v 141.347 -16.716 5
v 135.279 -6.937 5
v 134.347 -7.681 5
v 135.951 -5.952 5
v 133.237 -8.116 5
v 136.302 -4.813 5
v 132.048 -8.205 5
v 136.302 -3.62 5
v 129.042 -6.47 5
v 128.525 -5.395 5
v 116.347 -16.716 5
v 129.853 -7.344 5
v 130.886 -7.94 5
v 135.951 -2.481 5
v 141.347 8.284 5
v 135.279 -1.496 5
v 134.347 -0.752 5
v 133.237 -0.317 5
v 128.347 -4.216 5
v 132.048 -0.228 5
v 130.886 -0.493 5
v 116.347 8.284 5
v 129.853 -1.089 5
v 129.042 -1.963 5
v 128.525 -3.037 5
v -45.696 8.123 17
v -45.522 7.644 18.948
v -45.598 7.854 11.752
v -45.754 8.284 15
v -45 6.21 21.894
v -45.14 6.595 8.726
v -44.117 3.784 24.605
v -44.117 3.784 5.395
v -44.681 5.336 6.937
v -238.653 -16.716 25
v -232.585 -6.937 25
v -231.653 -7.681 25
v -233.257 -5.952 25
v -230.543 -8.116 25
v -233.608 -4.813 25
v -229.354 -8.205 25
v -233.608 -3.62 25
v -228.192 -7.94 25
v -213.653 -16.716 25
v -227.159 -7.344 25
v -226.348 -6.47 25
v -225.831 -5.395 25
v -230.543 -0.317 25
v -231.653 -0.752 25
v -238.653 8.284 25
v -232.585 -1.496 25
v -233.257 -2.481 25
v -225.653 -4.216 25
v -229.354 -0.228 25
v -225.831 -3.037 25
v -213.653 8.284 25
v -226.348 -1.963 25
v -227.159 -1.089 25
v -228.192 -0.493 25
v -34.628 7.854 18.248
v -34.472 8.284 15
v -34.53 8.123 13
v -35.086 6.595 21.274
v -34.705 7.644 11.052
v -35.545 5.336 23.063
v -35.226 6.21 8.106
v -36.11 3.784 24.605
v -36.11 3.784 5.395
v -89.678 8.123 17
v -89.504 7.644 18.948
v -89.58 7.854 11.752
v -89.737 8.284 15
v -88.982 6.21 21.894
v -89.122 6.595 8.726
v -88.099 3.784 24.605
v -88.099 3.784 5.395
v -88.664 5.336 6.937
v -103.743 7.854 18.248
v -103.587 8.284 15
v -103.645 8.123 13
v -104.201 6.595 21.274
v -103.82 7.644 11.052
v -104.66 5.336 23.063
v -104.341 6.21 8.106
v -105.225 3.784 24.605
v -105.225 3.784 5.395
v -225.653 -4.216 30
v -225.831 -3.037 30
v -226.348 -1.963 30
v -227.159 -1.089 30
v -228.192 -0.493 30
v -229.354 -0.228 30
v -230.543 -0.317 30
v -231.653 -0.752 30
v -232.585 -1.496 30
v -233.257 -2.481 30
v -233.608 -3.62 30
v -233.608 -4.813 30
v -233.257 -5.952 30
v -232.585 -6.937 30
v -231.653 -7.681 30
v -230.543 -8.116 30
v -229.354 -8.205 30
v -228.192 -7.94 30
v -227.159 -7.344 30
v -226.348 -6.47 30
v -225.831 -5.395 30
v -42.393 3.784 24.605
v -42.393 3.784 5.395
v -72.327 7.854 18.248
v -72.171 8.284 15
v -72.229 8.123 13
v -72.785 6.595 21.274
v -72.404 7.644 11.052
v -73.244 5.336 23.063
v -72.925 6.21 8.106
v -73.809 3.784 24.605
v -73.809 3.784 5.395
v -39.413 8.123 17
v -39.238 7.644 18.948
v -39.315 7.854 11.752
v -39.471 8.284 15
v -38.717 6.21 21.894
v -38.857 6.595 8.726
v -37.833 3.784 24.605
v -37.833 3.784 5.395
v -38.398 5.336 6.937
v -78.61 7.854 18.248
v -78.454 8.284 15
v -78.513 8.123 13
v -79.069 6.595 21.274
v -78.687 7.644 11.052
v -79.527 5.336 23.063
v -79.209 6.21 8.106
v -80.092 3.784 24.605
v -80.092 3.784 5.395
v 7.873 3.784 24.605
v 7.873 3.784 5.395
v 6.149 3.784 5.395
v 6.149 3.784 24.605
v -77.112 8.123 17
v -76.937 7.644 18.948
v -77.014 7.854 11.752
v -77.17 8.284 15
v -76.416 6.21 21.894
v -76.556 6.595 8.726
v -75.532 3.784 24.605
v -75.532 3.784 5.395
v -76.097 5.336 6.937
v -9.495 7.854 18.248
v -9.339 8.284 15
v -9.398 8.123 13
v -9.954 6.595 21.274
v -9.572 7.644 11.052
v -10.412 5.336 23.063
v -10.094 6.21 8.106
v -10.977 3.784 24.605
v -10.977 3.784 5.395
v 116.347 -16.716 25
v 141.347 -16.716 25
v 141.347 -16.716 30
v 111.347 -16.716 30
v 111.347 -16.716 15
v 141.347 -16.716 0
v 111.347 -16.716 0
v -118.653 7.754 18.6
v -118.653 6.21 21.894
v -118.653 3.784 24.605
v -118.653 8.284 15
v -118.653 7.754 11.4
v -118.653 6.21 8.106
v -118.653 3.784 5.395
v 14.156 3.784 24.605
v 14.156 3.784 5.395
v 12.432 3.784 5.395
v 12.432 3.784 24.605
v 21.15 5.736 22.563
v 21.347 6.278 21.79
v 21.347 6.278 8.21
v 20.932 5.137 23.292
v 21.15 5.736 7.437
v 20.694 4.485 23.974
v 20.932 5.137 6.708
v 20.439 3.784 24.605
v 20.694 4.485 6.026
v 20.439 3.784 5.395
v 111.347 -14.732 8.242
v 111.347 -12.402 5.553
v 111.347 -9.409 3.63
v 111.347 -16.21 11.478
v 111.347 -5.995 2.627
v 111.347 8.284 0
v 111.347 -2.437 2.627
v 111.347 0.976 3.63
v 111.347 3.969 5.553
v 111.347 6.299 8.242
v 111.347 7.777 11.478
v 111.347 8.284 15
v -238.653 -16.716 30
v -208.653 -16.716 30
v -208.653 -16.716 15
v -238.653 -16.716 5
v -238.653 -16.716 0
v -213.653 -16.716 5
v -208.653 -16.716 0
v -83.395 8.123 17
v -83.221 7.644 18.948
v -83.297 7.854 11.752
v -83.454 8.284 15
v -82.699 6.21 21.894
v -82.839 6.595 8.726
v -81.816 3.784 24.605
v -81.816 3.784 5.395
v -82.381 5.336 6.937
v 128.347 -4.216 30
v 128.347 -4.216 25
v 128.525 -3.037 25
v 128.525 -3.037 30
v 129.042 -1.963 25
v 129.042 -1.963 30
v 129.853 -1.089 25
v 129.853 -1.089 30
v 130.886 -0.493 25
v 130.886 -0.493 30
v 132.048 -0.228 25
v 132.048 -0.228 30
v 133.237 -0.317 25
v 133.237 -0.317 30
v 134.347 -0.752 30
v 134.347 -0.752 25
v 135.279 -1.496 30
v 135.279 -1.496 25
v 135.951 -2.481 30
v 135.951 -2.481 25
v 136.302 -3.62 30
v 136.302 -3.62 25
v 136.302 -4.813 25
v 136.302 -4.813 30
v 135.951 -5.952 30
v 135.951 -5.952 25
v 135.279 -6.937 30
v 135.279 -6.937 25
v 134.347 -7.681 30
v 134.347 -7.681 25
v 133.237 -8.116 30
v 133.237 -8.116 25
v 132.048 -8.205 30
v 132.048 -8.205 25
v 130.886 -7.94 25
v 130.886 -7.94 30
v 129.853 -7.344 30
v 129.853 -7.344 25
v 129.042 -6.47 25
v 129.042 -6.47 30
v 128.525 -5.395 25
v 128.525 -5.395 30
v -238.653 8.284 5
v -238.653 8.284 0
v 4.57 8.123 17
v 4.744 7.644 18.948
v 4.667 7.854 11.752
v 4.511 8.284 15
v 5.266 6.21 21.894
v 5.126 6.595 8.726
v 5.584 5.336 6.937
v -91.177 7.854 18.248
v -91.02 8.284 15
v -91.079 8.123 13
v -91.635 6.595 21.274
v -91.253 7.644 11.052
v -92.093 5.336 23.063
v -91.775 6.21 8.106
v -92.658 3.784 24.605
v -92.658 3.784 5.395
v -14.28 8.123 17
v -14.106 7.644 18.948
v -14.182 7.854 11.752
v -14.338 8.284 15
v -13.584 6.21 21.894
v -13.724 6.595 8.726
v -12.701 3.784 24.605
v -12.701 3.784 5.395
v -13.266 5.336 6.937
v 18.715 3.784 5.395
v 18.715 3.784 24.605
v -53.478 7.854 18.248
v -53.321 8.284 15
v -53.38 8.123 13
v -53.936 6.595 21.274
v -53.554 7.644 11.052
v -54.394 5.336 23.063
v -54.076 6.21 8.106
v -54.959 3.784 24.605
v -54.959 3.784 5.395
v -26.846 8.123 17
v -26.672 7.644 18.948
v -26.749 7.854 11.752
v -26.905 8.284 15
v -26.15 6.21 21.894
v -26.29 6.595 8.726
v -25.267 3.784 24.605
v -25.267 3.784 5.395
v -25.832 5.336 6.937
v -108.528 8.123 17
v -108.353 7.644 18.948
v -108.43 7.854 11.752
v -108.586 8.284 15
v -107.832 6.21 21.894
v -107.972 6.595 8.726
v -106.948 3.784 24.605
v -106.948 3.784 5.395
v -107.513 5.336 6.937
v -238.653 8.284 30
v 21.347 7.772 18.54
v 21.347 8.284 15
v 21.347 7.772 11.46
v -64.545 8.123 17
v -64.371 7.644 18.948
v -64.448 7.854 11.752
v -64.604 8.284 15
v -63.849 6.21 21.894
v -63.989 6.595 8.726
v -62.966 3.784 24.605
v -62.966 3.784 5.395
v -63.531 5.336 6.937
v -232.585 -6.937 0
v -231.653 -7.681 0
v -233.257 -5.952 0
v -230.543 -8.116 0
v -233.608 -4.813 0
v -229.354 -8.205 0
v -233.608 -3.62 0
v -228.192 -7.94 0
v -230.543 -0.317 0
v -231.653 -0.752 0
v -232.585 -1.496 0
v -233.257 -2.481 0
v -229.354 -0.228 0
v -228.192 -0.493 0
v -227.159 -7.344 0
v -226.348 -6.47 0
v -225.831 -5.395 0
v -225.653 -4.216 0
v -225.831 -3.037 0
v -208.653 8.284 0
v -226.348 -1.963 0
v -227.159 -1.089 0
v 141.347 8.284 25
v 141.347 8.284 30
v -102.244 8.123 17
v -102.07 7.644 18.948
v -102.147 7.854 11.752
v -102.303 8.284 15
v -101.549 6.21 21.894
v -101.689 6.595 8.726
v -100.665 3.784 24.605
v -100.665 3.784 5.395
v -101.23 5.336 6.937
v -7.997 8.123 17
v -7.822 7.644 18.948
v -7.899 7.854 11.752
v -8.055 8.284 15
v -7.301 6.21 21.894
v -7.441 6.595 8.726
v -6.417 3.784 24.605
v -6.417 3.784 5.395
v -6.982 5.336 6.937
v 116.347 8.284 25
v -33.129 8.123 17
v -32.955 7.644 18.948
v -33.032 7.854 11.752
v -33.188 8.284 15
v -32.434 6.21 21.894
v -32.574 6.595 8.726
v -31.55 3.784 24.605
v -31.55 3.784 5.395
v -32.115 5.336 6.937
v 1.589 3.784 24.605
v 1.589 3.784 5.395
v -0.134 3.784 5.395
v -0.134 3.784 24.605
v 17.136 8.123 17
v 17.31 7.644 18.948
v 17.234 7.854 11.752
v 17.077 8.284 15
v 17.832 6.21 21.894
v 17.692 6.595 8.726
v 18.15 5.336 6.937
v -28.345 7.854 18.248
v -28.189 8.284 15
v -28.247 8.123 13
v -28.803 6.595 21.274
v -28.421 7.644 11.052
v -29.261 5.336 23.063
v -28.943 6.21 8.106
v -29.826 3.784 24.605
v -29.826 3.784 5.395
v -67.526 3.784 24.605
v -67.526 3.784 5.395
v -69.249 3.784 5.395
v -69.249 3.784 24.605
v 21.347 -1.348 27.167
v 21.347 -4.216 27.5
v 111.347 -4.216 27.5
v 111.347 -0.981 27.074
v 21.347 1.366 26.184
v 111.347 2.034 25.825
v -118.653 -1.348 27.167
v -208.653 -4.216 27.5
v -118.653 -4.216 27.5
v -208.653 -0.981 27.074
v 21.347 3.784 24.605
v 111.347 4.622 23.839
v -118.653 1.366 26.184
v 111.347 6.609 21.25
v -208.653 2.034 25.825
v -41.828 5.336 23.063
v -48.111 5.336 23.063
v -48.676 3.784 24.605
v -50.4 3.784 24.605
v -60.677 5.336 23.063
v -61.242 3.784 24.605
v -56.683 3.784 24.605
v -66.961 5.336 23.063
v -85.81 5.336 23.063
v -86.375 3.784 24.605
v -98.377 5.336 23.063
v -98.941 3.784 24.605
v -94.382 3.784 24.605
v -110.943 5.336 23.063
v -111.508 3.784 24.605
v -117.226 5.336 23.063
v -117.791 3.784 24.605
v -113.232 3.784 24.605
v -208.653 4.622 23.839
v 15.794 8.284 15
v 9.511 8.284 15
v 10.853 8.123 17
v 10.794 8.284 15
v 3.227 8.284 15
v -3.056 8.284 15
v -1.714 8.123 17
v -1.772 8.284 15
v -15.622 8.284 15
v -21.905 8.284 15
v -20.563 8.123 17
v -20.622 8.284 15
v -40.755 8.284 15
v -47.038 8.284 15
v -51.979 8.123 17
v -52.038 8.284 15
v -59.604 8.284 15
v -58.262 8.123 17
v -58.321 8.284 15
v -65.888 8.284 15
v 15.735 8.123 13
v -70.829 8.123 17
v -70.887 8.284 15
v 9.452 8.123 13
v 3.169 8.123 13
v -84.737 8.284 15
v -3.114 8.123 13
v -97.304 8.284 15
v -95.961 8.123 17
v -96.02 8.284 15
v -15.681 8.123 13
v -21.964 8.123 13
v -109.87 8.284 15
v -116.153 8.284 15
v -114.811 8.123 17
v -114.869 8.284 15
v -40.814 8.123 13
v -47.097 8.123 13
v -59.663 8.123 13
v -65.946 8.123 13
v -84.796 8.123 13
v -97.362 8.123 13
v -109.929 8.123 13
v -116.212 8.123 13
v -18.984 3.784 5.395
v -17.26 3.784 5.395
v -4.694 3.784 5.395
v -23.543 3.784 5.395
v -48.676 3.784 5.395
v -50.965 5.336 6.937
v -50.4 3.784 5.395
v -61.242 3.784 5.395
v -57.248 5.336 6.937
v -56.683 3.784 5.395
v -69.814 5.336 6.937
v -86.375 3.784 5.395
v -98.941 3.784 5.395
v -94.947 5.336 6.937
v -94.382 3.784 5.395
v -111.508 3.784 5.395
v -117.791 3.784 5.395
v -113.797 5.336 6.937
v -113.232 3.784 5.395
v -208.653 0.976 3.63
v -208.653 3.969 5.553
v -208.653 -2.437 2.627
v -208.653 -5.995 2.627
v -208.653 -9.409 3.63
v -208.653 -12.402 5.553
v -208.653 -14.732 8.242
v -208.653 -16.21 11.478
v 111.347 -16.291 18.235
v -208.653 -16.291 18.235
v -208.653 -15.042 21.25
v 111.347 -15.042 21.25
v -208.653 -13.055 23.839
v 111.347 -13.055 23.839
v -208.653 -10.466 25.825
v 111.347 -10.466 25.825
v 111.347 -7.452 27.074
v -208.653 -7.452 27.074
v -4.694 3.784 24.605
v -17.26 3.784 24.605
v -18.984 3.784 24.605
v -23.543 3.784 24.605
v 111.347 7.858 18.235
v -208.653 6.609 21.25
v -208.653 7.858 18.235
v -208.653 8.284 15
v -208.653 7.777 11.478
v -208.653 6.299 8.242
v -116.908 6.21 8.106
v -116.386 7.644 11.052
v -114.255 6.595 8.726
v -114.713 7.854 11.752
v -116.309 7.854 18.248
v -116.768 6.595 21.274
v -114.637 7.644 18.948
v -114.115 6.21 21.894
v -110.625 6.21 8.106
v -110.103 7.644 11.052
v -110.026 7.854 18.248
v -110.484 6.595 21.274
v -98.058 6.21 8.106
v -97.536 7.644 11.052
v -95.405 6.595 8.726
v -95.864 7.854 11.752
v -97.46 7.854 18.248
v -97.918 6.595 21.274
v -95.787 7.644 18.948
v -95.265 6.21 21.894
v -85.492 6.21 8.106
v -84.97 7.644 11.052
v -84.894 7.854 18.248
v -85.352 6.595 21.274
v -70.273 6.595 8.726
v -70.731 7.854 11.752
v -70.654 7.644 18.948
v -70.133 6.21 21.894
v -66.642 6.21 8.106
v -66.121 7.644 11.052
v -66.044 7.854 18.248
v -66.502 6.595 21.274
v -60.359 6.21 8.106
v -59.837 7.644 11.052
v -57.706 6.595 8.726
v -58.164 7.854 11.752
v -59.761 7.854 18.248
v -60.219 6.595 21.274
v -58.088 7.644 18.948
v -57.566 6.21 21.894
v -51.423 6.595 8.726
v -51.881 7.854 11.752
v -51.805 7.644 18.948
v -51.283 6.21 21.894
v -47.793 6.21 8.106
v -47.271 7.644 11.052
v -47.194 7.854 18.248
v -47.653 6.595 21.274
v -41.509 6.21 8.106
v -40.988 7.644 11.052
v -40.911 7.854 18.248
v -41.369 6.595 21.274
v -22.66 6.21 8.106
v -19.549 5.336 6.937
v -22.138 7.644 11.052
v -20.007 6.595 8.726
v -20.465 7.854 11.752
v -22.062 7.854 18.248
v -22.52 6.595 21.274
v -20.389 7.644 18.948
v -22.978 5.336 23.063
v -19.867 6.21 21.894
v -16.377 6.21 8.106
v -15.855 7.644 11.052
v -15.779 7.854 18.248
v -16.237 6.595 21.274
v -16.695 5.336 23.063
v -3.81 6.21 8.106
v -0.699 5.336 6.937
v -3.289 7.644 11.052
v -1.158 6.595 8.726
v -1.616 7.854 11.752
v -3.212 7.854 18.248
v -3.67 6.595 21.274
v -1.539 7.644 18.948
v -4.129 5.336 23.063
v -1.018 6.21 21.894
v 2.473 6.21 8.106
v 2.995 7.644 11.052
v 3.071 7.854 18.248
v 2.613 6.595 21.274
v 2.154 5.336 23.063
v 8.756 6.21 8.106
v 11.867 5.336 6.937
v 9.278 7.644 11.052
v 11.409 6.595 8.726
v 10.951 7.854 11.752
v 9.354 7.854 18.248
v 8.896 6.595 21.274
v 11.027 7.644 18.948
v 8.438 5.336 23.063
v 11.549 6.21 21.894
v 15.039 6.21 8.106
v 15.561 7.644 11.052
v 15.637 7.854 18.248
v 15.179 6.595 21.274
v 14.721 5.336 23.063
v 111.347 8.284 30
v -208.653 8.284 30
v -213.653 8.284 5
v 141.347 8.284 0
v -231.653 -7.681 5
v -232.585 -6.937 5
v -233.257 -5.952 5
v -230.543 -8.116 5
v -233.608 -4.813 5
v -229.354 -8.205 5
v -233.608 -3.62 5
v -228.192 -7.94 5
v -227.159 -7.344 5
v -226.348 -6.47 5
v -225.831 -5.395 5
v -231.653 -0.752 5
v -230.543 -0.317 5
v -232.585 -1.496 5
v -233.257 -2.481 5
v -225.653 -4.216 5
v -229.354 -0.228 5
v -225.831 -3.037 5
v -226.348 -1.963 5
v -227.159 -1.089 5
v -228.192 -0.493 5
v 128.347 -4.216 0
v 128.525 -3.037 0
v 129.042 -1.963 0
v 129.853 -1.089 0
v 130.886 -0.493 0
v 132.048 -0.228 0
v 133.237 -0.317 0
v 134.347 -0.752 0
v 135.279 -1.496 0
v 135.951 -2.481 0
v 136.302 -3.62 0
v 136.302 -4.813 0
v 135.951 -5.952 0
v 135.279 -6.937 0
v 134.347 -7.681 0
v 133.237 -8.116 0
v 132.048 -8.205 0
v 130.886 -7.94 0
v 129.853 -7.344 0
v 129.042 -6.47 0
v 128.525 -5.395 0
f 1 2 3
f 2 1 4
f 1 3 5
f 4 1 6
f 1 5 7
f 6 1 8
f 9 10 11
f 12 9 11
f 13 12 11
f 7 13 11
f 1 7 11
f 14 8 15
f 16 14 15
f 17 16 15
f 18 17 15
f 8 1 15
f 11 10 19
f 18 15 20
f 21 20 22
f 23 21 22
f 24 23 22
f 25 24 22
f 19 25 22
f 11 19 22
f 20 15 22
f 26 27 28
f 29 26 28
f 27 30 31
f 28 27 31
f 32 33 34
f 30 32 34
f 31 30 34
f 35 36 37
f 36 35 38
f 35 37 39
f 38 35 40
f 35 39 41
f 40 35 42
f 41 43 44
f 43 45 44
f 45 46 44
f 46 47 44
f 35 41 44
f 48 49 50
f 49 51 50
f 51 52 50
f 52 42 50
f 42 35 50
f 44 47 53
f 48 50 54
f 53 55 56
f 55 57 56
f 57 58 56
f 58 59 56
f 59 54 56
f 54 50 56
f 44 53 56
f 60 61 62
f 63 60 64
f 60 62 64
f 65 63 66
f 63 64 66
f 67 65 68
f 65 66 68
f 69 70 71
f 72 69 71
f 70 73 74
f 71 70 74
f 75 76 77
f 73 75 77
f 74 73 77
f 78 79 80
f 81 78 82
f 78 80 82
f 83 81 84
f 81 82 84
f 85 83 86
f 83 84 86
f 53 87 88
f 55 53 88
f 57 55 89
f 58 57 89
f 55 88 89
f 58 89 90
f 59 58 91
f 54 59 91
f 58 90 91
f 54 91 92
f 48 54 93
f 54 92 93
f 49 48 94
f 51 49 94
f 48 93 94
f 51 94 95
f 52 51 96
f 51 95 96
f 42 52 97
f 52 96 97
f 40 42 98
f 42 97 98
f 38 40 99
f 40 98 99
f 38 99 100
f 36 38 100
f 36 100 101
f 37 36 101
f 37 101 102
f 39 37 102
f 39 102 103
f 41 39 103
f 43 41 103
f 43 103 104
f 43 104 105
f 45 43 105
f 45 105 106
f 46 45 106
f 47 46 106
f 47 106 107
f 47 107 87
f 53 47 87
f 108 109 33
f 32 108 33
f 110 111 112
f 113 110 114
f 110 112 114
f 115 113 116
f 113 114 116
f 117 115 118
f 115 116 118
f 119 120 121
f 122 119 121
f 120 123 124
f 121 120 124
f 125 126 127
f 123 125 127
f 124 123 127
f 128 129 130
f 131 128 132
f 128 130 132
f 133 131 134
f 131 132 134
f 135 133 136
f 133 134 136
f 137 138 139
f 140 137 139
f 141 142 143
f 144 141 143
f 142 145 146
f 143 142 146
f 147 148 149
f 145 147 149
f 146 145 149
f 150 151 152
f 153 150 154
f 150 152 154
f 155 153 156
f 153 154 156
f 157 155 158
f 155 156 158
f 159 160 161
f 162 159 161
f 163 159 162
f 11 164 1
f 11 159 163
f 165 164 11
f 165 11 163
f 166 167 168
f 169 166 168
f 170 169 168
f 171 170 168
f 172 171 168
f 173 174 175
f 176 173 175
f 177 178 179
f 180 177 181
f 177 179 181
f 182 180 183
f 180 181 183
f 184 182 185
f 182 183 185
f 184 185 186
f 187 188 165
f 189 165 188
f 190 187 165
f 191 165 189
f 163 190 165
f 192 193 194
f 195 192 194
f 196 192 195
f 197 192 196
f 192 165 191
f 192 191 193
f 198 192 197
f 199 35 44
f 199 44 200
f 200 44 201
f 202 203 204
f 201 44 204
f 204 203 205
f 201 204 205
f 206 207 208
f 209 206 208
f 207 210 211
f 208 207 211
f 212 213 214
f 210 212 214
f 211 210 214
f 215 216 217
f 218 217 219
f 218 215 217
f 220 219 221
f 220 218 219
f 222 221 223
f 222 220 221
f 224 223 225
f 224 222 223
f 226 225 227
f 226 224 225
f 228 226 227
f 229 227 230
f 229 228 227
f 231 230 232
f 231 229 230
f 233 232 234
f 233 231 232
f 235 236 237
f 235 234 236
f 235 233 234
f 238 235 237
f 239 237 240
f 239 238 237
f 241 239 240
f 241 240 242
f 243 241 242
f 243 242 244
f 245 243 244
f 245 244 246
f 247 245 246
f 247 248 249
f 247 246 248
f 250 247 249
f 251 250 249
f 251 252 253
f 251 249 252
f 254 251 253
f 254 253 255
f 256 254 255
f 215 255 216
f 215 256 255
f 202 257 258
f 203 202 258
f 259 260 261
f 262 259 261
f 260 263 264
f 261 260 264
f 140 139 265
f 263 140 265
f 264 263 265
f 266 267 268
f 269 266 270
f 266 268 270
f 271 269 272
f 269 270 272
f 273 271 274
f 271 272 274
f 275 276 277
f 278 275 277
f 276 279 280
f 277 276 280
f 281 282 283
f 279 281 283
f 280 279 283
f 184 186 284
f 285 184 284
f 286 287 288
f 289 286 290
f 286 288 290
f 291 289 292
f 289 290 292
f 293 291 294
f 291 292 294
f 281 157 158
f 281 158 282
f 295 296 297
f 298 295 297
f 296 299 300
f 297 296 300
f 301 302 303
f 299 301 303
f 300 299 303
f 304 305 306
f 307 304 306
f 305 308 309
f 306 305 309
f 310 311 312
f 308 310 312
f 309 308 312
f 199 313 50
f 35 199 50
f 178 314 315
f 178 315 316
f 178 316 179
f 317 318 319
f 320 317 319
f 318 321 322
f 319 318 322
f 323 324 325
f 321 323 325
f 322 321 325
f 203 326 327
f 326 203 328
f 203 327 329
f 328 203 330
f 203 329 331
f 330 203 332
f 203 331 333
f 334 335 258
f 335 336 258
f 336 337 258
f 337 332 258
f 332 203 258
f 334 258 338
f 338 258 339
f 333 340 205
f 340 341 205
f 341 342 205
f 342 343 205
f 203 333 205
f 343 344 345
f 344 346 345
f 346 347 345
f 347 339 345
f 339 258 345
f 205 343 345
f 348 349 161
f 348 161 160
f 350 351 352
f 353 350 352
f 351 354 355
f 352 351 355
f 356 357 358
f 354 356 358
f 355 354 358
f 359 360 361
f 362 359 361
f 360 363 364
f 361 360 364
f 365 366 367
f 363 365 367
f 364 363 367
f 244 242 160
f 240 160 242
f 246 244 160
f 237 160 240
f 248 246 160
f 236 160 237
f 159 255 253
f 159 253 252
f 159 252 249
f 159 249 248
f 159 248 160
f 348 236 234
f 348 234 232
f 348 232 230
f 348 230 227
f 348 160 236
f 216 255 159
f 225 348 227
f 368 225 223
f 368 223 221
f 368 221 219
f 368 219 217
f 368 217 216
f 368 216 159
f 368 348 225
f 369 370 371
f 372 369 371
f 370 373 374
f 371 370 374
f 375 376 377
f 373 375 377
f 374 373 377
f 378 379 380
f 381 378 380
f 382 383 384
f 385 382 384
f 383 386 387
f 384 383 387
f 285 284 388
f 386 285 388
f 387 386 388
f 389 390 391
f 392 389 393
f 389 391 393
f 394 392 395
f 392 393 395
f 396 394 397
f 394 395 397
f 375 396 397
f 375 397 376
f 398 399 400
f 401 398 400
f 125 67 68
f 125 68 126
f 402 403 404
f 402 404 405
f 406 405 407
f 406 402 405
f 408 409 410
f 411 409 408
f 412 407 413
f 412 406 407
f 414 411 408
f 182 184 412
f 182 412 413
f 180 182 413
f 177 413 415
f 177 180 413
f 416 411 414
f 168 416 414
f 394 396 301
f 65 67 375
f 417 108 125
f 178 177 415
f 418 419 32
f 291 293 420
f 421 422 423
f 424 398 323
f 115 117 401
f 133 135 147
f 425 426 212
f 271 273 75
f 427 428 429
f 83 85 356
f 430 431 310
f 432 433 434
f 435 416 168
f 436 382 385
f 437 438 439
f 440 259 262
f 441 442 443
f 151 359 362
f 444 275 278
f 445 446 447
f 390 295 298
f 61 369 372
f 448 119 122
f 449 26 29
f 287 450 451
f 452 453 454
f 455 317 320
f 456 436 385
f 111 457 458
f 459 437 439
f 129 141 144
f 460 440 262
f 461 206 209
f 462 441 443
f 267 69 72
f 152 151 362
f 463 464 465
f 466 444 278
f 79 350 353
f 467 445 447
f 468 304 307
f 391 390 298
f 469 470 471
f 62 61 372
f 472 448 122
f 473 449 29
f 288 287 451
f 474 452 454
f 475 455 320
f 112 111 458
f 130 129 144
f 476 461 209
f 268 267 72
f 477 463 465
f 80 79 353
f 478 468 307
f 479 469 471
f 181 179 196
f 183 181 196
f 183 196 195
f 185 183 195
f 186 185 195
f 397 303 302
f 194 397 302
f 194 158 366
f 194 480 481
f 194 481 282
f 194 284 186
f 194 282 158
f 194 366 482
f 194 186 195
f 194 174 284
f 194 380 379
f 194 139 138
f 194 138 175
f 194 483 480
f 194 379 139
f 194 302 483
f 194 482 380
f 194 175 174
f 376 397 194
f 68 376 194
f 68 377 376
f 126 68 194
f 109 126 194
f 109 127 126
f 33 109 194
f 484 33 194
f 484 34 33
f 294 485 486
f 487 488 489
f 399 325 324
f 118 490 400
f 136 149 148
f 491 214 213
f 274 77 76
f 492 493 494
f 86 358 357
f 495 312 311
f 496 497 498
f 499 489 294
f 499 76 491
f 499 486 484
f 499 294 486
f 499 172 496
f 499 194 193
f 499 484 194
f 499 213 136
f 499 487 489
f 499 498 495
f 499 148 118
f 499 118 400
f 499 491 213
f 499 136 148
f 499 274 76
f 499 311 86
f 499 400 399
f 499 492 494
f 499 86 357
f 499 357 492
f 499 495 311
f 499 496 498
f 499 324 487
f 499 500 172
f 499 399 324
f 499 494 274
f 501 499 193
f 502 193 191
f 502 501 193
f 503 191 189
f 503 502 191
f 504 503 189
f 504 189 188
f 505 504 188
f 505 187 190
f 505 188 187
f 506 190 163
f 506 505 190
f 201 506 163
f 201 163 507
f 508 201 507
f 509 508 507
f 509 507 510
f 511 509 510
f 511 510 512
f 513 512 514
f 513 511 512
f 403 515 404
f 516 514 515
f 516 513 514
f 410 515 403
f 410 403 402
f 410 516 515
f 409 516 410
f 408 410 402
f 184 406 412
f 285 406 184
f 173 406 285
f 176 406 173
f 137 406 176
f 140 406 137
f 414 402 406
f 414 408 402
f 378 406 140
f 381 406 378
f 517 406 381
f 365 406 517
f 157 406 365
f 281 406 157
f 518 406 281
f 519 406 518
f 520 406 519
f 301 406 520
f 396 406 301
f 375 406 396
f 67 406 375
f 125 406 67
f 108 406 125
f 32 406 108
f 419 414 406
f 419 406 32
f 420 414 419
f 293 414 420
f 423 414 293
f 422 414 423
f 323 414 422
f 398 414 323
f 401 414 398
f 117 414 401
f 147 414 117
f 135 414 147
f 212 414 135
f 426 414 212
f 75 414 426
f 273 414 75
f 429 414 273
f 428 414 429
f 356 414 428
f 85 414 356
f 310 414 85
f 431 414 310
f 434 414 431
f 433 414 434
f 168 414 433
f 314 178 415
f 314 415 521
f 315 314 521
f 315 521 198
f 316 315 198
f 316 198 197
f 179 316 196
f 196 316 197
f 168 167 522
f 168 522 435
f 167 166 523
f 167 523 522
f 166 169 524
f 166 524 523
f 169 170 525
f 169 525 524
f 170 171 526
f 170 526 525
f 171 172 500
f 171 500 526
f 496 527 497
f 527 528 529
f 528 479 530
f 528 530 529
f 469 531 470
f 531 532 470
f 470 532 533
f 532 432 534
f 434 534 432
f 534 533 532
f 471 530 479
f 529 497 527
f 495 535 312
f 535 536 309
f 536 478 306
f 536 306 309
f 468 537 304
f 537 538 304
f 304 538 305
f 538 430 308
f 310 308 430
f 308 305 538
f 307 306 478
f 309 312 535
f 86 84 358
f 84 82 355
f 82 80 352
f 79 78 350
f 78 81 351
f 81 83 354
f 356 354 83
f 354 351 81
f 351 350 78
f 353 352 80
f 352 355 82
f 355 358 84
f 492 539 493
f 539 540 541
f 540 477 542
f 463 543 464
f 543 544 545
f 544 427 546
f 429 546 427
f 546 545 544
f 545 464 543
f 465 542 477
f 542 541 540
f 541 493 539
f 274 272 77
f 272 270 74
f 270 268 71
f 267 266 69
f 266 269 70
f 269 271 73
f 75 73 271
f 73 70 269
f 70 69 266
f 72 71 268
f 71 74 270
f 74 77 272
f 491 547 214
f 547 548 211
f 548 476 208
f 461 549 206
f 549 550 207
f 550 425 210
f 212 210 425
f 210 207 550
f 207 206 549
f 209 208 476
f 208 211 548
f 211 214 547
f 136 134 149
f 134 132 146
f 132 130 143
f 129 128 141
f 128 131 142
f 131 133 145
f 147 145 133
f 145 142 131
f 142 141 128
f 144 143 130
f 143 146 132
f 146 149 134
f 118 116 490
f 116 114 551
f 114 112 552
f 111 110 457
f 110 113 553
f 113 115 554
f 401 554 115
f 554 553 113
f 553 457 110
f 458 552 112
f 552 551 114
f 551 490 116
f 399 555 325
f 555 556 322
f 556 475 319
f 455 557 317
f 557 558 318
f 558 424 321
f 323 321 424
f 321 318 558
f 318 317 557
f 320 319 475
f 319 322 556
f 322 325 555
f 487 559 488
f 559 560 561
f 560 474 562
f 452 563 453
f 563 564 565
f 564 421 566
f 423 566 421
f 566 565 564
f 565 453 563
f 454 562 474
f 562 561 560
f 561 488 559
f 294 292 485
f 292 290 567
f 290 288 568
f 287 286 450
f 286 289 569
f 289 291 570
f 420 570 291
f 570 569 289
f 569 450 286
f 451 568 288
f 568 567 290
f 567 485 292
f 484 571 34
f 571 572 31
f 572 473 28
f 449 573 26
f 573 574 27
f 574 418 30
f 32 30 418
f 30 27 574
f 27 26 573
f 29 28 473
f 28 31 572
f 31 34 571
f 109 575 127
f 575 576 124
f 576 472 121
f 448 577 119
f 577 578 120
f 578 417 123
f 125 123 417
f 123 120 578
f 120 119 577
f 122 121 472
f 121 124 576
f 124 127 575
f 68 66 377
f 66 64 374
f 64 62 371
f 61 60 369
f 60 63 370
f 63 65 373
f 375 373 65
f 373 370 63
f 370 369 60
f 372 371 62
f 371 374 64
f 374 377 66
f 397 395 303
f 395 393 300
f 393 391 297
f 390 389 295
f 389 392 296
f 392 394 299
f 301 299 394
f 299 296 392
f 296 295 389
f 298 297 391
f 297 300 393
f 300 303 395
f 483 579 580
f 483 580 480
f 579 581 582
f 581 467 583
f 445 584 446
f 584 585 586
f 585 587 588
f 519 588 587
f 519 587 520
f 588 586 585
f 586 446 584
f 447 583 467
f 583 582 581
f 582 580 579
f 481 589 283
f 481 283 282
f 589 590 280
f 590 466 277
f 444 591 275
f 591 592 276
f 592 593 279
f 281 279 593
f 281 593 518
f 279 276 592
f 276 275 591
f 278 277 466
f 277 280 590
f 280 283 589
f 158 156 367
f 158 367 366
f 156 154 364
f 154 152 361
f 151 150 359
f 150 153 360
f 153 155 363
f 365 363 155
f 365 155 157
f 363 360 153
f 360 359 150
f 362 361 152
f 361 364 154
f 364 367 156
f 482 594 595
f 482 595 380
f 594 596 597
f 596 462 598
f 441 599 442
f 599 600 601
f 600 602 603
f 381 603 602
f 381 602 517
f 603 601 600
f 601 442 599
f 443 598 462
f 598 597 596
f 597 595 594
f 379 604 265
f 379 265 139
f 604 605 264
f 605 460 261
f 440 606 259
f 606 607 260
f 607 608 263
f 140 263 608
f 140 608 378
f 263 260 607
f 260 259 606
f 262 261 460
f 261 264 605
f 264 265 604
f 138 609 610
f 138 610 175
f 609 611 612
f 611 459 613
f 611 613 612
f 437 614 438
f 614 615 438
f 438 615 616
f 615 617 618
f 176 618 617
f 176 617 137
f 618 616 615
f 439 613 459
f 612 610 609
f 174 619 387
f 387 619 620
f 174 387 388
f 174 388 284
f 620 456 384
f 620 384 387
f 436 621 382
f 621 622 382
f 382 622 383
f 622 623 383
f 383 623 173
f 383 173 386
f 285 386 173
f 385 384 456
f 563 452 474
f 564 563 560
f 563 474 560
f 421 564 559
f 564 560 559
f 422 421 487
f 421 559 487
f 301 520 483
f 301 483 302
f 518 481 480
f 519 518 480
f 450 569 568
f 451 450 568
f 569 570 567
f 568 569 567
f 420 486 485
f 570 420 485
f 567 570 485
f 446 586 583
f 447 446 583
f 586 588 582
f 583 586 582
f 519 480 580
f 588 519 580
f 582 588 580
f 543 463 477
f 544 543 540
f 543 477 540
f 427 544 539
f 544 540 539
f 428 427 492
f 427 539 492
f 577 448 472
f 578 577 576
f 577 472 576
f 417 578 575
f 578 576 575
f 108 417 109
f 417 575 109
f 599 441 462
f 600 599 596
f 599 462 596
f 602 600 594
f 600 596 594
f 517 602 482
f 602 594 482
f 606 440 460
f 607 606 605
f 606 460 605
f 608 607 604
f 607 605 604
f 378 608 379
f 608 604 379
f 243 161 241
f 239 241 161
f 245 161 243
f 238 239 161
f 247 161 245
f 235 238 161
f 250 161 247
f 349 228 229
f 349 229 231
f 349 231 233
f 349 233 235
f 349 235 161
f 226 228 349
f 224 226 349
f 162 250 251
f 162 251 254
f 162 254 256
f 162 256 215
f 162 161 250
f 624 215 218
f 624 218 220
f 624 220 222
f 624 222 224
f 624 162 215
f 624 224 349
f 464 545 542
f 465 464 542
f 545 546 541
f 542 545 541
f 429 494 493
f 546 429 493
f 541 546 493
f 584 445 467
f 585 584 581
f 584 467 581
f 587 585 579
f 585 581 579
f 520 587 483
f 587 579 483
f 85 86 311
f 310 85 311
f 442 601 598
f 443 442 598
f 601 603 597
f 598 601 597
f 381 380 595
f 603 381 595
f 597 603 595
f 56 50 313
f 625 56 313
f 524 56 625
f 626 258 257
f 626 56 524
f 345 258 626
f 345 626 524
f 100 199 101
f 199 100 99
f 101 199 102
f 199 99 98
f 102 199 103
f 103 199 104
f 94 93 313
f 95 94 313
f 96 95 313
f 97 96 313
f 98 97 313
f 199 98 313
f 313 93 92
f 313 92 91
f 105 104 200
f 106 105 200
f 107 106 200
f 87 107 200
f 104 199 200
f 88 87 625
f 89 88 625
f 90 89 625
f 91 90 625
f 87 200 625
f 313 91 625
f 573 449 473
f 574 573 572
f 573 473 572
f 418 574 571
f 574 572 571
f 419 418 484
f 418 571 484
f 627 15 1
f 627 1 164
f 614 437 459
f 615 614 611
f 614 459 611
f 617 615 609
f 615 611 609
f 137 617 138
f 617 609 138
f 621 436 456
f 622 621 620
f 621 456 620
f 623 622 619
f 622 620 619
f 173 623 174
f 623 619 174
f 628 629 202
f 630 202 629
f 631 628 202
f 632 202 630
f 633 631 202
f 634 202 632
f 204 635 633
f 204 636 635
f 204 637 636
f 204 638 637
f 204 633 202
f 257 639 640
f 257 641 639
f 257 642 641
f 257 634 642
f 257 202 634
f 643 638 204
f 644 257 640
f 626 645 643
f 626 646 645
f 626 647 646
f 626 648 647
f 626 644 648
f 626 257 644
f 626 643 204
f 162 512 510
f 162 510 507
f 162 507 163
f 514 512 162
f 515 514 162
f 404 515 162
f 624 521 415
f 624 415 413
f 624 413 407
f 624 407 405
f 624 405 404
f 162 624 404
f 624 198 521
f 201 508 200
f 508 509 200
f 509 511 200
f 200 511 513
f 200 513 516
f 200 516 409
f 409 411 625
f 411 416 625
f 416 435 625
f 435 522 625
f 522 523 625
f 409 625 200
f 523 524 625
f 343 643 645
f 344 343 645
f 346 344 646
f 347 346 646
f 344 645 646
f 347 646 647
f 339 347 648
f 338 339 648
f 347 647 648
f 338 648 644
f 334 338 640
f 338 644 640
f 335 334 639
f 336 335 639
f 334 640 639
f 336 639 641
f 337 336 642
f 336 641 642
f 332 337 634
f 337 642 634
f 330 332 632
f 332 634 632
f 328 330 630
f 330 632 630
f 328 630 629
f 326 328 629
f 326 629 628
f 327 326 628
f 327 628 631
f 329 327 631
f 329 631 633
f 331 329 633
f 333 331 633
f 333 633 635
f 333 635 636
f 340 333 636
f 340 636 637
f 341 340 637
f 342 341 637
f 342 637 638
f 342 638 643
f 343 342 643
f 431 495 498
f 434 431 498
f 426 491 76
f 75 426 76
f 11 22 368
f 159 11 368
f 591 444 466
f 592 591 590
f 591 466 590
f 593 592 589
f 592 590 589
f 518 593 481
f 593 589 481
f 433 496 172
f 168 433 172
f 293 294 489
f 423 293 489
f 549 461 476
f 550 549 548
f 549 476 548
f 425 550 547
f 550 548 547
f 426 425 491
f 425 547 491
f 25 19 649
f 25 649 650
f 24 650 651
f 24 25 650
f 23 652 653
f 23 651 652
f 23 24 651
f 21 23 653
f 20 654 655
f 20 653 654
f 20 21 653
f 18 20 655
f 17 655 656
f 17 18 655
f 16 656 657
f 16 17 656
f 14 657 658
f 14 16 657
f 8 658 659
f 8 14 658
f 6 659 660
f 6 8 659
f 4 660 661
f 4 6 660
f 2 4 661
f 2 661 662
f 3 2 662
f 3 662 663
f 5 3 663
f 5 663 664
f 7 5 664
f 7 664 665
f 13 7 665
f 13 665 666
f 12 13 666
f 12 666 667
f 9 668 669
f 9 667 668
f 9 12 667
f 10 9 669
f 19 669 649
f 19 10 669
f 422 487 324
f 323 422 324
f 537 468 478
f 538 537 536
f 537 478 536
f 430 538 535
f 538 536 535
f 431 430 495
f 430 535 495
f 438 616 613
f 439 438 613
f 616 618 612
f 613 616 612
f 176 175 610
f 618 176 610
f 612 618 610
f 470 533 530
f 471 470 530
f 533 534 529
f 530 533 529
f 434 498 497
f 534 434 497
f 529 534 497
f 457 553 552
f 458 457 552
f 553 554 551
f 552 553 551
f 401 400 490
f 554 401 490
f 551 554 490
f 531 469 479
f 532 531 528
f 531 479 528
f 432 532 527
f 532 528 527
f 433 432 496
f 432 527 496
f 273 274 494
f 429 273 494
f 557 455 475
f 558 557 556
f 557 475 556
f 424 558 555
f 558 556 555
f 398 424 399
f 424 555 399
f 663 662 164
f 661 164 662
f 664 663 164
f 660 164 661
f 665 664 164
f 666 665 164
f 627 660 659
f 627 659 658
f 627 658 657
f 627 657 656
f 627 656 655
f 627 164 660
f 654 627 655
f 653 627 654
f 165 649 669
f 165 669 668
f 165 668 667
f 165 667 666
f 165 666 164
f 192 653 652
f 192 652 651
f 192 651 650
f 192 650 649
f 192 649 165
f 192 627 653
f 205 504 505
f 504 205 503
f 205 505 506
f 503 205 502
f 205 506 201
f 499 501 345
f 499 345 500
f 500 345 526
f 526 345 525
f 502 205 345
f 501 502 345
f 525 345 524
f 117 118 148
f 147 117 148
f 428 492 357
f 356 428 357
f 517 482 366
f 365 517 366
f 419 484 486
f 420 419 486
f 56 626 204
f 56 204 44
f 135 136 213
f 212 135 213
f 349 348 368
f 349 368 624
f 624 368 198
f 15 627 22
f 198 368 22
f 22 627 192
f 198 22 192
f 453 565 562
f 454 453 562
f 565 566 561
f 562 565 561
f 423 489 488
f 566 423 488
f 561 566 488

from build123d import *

# Parameters (mm, degrees)
BOSS_EXTRUDE1_DEPTH = 30
SKETCH2_R           = 30
SKETCH2_R_2         = 12.5
CUT_EXTRUDE1_DEPTH  = 146.129146151
BOSS_EXTRUDE2_START = 90
SKETCH3_R           = 12.5
BOSS_EXTRUDE2_DEPTH = 90
BOSS_EXTRUDE3_START = -140
SKETCH3_2_R         = 12.5
BOSS_EXTRUDE3_DEPTH = 90
SKETCH4_W           = 30
SKETCH4_H           = 25
BOSS_EXTRUDE4_DEPTH = 5
SKETCH8_W           = 30
SKETCH8_H           = 5
BOSS_EXTRUDE7_DEPTH = 25
SKETCH9_R           = 4
CUT_EXTRUDE2_DEPTH  = 242.111266906


with BuildPart() as part:
    # Sketch1 → Boss-Extrude1 (new body)
    with BuildSketch(Plane.XY):
        Polygon((20.439052972, 3.783569778), (18.715311494, 3.783569778), (17.077445439, 8.283569778), (15.793733726, 8.283569778), (14.155867672, 3.783569778), (12.432126194, 3.783569778), (10.794260139, 8.283569778), (9.510548426, 8.283569778), (7.872682372, 3.783569778), (6.148940894, 3.783569778), (4.511074839, 8.283569778), (3.227363126, 8.283569778), (1.589497072, 3.783569778), (-0.134244406, 3.783569778), (-1.772110461, 8.283569778), (-3.055822174, 8.283569778), (-4.693688228, 3.783569778), (-6.417429706, 3.783569778), (-8.055295761, 8.283569778), (-9.339007474, 8.283569778), (-10.976873528, 3.783569778), (-12.700615006, 3.783569778), (-14.338481061, 8.283569778), (-15.622192774, 8.283569778), (-17.260058828, 3.783569778), (-18.983800306, 3.783569778), (-20.621666361, 8.283569778), (-21.905378074, 8.283569778), (-23.543244128, 3.783569778), (-25.266985606, 3.783569778), (-26.904851661, 8.283569778), (-28.188563374, 8.283569778), (-29.826429428, 3.783569778), (-31.550170906, 3.783569778), (-33.188036961, 8.283569778), (-34.471748674, 8.283569778), (-36.109614728, 3.783569778), (-37.833356206, 3.783569778), (-39.471222261, 8.283569778), (-40.754933974, 8.283569778), (-42.392800028, 3.783569778), (-44.116541506, 3.783569778), (-45.754407561, 8.283569778), (-47.038119274, 8.283569778), (-48.675985328, 3.783569778), (-50.399726806, 3.783569778), (-52.037592861, 8.283569778), (-53.321304574, 8.283569778), (-54.959170628, 3.783569778), (-56.682912106, 3.783569778), (-58.320778161, 8.283569778), (-59.604489874, 8.283569778), (-61.242355928, 3.783569778), (-62.966097406, 3.783569778), (-64.603963461, 8.283569778), (-65.887675174, 8.283569778), (-67.525541228, 3.783569778), (-69.249282706, 3.783569778), (-70.887148761, 8.283569778), (-72.170860474, 8.283569778), (-73.808726528, 3.783569778), (-75.532468006, 3.783569778), (-77.170334061, 8.283569778), (-78.454045774, 8.283569778), (-80.091911828, 3.783569778), (-81.815653306, 3.783569778), (-83.453519361, 8.283569778), (-84.737231074, 8.283569778), (-86.375097128, 3.783569778), (-88.098838606, 3.783569778), (-89.736704661, 8.283569778), (-91.020416374, 8.283569778), (-92.658282428, 3.783569778), (-94.382023906, 3.783569778), (-96.019889961, 8.283569778), (-97.303601674, 8.283569778), (-98.941467728, 3.783569778), (-100.665209206, 3.783569778), (-102.303075261, 8.283569778), (-103.586786974, 8.283569778), (-105.224653028, 3.783569778), (-106.948394506, 3.783569778), (-108.586260561, 8.283569778), (-109.869972274, 8.283569778), (-111.507838328, 3.783569778), (-113.231579806, 3.783569778), (-114.869445861, 8.283569778), (-116.153157574, 8.283569778), (-117.791023628, 3.783569778), (-118.652894367, 3.783569778), (-118.652894367, -23.716430222), (21.347105633, -23.716430222), (21.347105633, 6.278423959), align=None)
    extrude(amount=BOSS_EXTRUDE1_DEPTH)

    # Sketch2 → Cut-Extrude1 (cut, through all)
    with BuildSketch(Plane.ZY.offset(118.652894367)):
        with Locations((15, -4.216430222)):
            Circle(SKETCH2_R)
        with Locations((15, -4.216430222)):
            Circle(SKETCH2_R_2, mode=Mode.SUBTRACT)
    extrude(amount=-CUT_EXTRUDE1_DEPTH, mode=Mode.SUBTRACT)

    # Sketch3 → Boss-Extrude2 (add)
    with BuildSketch(Plane.ZY.offset(118.652894367).offset(BOSS_EXTRUDE2_START)):
        with Locations((15, -4.216430222)):
            Circle(SKETCH3_R)
    extrude(amount=-BOSS_EXTRUDE2_DEPTH)

    # Sketch3<2> → Boss-Extrude3 (add)
    with BuildSketch(Plane.ZY.offset(118.652894367).offset(BOSS_EXTRUDE3_START)):
        with Locations((15, -4.216430222)):
            Circle(SKETCH3_2_R)
    extrude(amount=-BOSS_EXTRUDE3_DEPTH)

    # Sketch4 → Boss-Extrude4 (add)
    with BuildSketch(Plane.ZY.offset(208.652894367)):
        with Locations((15, -4.216430222)):
            Rectangle(SKETCH4_W, SKETCH4_H)
    boss_extrude4 = extrude(amount=BOSS_EXTRUDE4_DEPTH)

    # Sketch8 → Boss-Extrude7 (add)
    with BuildSketch(Plane(origin=(0, 8.283569778, 0), x_dir=(1, 0, 0), z_dir=(0, 1, 0))):
        with Locations((-223.652894367, -2.5)):
            Rectangle(SKETCH8_W, SKETCH8_H)
        with Locations((-223.652894367, -27.5)):
            Rectangle(SKETCH8_W, SKETCH8_H)
    boss_extrude7 = extrude(amount=-BOSS_EXTRUDE7_DEPTH)

    # Sketch9 → Cut-Extrude2 (cut, through all)
    with BuildSketch(Plane.XY.offset(30)):
        with Locations((-229.652894367, -4.216430222)):
            Circle(SKETCH9_R)
    cut_extrude2 = extrude(amount=-CUT_EXTRUDE2_DEPTH, mode=Mode.SUBTRACT)

    # Mirror1: Boss-Extrude4, Boss-Extrude7, Cut-Extrude2 across plane
    add(boss_extrude4.mirror(Plane(origin=(-48.652894367, 0, 0), x_dir=(0, 0, 1), z_dir=(1, 0, 0))))
    add(boss_extrude7.mirror(Plane(origin=(-48.652894367, 0, 0), x_dir=(0, 0, 1), z_dir=(1, 0, 0))))
    add(cut_extrude2.mirror(Plane(origin=(-48.652894367, 0, 0), x_dir=(0, 0, 1), z_dir=(1, 0, 0))), mode=Mode.SUBTRACT)


solid = part.part
